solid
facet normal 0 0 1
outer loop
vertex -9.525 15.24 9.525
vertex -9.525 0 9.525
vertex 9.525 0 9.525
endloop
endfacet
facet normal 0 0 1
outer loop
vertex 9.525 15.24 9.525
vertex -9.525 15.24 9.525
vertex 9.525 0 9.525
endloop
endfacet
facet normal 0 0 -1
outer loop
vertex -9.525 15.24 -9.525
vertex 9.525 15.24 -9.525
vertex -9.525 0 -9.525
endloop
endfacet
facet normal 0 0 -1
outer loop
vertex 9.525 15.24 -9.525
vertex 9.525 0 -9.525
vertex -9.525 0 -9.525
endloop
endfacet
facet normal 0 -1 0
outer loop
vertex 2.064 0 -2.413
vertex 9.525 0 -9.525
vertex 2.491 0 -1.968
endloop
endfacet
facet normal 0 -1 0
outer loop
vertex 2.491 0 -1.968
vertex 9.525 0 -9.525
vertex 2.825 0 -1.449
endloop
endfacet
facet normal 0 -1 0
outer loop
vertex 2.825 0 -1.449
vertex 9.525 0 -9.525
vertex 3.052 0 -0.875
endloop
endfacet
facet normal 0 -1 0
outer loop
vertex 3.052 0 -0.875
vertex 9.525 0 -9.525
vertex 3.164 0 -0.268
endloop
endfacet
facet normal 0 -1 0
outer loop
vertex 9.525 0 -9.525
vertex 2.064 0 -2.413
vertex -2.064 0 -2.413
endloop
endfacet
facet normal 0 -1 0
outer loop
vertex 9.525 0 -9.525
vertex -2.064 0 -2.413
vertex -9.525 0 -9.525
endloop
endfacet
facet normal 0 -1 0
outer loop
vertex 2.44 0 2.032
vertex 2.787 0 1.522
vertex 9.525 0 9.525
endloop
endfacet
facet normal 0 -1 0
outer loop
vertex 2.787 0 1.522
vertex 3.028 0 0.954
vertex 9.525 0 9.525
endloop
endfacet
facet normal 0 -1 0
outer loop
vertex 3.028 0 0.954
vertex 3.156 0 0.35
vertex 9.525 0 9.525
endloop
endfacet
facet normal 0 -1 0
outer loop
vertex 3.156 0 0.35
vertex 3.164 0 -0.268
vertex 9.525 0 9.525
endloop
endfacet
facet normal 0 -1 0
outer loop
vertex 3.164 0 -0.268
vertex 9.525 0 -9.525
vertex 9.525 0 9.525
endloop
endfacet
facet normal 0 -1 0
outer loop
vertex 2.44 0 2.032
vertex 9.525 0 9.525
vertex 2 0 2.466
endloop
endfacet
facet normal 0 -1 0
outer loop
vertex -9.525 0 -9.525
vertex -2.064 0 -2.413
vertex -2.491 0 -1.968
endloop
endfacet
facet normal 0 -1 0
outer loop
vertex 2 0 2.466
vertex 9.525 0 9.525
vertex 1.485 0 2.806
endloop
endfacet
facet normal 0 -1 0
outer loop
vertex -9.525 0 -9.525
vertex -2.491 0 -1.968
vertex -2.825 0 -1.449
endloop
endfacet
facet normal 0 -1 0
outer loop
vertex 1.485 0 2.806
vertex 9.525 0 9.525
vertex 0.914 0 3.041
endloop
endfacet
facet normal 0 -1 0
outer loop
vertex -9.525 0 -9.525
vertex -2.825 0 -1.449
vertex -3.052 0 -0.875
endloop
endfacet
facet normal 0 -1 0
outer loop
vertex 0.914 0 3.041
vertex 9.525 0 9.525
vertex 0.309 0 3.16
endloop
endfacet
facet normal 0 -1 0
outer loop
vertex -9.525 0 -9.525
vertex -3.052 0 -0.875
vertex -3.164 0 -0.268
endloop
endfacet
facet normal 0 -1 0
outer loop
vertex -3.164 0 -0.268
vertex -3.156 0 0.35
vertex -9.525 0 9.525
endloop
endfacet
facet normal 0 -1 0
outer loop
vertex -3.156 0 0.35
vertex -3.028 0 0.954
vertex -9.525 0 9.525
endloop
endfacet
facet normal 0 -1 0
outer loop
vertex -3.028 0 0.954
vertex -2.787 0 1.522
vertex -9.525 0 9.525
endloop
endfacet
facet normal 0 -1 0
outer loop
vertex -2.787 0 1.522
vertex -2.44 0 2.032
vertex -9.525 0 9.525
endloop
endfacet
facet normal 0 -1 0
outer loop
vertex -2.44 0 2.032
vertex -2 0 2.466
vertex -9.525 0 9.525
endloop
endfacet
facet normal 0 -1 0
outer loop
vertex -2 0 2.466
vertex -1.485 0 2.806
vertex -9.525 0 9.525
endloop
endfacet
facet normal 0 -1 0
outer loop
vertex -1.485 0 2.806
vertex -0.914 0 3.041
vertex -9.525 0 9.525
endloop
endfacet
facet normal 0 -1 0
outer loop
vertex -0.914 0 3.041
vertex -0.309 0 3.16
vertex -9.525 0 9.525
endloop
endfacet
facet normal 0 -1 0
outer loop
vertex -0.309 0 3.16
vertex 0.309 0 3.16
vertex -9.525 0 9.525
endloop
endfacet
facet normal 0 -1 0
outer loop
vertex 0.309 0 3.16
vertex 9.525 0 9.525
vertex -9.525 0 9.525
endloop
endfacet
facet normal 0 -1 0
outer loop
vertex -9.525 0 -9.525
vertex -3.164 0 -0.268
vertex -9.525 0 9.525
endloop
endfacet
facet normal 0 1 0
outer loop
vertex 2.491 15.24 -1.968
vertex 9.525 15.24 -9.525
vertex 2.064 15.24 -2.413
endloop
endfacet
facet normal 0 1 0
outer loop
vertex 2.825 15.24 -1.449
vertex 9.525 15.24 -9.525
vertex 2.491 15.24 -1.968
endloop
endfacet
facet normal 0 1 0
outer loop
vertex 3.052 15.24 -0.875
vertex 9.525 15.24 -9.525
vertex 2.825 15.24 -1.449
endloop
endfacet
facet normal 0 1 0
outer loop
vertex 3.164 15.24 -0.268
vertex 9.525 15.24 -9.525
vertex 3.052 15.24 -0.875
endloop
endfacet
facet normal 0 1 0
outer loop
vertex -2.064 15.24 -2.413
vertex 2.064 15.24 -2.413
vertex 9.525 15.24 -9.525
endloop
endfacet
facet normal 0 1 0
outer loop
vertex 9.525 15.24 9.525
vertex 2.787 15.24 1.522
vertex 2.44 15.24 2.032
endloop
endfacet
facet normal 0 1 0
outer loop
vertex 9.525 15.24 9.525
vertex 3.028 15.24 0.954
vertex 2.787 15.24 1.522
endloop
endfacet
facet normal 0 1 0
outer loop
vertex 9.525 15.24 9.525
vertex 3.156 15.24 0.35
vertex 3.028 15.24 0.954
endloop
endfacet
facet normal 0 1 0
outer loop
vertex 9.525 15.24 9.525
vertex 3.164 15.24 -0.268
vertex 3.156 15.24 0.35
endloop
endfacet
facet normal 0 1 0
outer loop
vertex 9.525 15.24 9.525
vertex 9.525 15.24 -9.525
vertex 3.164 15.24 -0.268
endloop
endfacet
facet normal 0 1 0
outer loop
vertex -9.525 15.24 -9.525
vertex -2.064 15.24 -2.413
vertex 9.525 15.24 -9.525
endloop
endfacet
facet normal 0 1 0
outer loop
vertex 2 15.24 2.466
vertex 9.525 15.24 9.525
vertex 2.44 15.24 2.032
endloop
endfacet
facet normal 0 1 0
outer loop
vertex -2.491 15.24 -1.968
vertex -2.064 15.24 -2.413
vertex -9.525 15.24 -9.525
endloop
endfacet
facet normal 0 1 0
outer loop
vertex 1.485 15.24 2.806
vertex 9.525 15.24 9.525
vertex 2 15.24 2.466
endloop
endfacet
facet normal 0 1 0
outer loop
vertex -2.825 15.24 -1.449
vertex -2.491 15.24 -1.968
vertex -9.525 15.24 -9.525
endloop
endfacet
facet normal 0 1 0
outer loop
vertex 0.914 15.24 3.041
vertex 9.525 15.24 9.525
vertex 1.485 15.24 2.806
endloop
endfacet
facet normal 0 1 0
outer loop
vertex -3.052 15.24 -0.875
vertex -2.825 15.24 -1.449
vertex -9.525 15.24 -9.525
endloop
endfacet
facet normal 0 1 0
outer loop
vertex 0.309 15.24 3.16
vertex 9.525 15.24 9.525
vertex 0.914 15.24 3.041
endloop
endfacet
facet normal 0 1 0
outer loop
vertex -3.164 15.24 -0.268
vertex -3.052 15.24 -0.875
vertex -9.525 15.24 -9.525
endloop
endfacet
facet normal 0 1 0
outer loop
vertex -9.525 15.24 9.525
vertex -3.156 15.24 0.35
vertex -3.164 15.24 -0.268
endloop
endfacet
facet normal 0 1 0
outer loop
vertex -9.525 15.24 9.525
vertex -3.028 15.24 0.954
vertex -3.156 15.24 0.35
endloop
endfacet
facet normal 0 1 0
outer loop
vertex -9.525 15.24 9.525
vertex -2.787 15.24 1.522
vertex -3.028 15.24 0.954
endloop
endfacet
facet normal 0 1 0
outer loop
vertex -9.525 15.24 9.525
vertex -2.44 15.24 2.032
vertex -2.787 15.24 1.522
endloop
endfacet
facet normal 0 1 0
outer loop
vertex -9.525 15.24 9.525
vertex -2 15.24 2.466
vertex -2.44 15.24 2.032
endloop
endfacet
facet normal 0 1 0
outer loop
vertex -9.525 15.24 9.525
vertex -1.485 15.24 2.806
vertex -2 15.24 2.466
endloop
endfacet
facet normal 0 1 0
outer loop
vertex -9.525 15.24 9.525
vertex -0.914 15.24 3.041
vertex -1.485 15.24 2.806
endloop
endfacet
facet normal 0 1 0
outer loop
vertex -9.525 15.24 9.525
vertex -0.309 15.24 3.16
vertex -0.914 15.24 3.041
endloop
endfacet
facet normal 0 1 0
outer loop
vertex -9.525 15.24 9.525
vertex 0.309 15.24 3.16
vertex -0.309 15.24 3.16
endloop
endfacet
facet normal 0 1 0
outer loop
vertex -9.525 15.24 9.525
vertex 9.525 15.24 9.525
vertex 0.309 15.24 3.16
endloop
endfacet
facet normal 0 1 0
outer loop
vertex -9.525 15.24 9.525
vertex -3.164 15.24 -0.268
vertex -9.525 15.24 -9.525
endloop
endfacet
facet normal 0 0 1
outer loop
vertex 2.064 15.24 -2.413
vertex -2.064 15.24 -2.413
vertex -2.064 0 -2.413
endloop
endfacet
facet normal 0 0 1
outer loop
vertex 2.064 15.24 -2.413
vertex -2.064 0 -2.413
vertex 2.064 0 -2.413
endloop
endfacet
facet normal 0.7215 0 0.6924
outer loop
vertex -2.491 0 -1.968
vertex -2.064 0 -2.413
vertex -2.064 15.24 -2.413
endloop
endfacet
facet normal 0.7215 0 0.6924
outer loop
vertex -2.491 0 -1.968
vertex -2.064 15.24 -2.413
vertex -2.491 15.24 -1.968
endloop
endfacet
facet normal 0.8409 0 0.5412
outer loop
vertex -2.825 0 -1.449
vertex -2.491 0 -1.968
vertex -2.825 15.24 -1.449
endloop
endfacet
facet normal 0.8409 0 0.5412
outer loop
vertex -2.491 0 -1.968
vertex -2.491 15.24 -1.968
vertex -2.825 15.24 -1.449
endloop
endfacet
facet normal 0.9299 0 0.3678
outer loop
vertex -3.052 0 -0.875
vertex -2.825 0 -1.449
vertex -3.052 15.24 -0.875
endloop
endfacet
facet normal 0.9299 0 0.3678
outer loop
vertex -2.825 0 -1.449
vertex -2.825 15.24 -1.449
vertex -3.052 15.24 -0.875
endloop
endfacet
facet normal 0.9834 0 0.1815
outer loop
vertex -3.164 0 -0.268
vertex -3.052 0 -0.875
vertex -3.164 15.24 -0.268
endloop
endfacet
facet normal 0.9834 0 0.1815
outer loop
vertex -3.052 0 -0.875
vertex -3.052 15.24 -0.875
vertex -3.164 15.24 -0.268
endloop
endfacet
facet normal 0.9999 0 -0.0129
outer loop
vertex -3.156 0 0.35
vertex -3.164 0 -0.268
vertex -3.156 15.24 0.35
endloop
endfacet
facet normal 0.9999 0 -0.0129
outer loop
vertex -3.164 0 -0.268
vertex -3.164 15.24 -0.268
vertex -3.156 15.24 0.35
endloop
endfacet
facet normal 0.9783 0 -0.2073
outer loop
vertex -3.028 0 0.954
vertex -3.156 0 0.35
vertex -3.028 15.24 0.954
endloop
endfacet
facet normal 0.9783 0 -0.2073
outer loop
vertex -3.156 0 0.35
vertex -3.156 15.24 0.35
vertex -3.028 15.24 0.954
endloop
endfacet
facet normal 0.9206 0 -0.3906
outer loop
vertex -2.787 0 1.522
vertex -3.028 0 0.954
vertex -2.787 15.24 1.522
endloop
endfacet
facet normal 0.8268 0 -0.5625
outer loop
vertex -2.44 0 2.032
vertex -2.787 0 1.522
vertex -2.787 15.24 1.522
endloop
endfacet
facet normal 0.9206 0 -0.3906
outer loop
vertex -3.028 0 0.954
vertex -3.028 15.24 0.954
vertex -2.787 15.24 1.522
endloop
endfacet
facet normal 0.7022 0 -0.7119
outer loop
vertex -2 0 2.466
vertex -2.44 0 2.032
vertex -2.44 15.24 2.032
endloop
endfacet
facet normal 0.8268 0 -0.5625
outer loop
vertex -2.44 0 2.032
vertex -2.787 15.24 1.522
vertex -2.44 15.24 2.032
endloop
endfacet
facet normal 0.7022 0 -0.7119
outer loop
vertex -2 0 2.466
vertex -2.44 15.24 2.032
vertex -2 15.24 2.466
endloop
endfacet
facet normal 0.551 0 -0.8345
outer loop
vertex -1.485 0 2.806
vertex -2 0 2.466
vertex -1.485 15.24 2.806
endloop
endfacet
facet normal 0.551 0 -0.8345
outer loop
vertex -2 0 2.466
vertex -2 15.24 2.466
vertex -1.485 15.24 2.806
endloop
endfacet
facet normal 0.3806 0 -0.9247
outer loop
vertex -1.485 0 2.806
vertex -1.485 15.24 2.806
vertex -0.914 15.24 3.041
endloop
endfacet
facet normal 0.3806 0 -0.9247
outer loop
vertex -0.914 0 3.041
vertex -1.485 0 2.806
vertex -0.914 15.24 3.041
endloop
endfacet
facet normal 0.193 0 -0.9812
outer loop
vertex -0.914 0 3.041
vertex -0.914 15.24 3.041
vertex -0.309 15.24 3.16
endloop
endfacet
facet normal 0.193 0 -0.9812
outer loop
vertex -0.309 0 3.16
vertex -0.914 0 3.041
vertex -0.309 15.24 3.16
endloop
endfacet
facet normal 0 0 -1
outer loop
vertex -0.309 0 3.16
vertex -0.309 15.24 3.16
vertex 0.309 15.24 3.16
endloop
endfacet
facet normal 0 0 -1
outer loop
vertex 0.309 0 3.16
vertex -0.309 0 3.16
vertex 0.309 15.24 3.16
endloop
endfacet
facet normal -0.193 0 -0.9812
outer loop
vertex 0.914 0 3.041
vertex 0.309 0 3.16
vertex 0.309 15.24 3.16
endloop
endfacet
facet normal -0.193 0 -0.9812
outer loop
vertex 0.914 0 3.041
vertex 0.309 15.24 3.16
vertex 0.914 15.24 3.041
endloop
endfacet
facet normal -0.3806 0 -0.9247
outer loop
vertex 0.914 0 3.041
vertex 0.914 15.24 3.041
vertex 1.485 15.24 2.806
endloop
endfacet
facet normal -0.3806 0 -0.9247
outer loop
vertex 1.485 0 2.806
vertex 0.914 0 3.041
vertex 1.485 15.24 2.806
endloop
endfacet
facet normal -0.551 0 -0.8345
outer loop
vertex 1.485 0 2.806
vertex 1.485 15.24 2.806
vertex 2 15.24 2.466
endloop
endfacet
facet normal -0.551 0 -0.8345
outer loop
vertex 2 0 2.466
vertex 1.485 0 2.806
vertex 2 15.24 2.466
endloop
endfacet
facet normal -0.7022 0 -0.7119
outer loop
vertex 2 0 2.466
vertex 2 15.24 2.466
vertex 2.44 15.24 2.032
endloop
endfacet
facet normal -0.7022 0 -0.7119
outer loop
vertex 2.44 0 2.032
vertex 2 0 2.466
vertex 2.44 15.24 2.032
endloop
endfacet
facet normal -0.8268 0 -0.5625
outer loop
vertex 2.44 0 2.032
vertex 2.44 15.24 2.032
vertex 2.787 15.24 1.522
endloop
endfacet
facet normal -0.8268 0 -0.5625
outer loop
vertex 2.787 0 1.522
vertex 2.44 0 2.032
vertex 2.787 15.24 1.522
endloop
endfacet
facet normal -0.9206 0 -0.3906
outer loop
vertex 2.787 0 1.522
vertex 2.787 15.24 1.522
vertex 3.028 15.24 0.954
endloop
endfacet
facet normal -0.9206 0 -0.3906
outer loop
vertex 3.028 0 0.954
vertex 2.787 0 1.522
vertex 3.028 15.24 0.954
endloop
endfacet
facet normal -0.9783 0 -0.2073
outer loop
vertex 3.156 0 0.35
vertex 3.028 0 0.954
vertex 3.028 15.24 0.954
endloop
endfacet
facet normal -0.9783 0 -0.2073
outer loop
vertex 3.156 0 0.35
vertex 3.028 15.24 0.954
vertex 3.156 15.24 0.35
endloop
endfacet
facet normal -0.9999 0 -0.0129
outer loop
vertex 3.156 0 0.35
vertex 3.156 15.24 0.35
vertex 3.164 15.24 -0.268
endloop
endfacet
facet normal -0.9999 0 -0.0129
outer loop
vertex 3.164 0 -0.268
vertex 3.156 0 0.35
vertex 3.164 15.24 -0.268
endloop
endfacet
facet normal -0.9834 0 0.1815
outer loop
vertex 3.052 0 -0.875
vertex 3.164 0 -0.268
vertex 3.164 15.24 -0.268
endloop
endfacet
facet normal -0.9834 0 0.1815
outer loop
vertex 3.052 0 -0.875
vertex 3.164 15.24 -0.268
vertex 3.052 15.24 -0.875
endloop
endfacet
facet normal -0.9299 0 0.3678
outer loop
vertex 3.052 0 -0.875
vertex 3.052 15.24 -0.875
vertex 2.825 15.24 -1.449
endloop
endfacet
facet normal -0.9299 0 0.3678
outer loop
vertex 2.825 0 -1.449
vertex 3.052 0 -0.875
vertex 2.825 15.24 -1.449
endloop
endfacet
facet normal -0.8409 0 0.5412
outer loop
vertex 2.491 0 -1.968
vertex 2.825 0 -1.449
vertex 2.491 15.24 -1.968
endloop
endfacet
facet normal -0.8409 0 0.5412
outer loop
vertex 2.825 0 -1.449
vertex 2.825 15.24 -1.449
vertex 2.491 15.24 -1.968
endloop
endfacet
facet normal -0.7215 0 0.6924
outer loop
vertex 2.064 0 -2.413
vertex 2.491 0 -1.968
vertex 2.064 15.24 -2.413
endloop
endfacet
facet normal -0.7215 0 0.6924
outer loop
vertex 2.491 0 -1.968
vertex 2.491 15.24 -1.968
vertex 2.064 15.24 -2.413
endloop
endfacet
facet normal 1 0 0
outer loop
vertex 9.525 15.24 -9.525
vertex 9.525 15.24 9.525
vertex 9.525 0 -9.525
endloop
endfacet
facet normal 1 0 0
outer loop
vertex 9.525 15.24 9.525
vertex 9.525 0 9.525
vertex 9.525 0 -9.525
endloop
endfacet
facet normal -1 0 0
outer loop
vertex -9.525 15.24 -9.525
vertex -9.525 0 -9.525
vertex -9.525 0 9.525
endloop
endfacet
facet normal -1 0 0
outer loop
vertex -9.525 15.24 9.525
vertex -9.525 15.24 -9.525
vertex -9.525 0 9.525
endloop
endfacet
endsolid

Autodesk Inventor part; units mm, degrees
ref_plane "YZ Plane" through (0, 0, 0) normal (1, 0, 0) x (0, 1, 0)
ref_plane "XZ Plane" through (0, 0, 0) normal (0, 1, 0) x (-1, 0, 0)
ref_plane "XY Plane" through (0, 0, 0) normal (0, 0, 1) x (1, 0, 0)
sketch "Sketch1" plane through (0, 0, 0) normal (0, 1, 0) x (-1, 0, 0)
  line L0 (-9.525, -9.525) -> (9.525, -9.525)
  line L1 (9.525, -9.525) -> (9.525, 9.525)
  line L2 (9.525, 9.525) -> (-9.525, 9.525)
  line L3 (-9.525, 9.525) -> (-9.525, -9.525)
  line L4 (-9.525, -9.525) -> (9.525, 9.525) construction
  line L5 (9.525, -9.525) -> (-9.525, 9.525) construction
  point P0 (0, 0)
  dimension "d0" = 19.05
  dimension "d1" = 19.05
extrude "Extrusion1" add sketch "Sketch1" along normal blind 15.24
sketch "Sketch2" plane through (0, 15.24, 0) normal (0, 1, 0) x (1, 0, 0)
  arc A0 (-2.0635, 2.413) -> (2.0635, 2.413) centre (0, 0) ccw
  line L0 (-2.0635, 2.413) -> (2.0635, 2.413)
  line L1 (-9.525, -9.525) -> (9.525, -9.525) projected
  dimension "d4" = 6.35
  dimension "d9" = 5.588
extrude "Extrusion2" cut sketch "Sketch2" against normal through all
properties part number "Shaft Connection"
